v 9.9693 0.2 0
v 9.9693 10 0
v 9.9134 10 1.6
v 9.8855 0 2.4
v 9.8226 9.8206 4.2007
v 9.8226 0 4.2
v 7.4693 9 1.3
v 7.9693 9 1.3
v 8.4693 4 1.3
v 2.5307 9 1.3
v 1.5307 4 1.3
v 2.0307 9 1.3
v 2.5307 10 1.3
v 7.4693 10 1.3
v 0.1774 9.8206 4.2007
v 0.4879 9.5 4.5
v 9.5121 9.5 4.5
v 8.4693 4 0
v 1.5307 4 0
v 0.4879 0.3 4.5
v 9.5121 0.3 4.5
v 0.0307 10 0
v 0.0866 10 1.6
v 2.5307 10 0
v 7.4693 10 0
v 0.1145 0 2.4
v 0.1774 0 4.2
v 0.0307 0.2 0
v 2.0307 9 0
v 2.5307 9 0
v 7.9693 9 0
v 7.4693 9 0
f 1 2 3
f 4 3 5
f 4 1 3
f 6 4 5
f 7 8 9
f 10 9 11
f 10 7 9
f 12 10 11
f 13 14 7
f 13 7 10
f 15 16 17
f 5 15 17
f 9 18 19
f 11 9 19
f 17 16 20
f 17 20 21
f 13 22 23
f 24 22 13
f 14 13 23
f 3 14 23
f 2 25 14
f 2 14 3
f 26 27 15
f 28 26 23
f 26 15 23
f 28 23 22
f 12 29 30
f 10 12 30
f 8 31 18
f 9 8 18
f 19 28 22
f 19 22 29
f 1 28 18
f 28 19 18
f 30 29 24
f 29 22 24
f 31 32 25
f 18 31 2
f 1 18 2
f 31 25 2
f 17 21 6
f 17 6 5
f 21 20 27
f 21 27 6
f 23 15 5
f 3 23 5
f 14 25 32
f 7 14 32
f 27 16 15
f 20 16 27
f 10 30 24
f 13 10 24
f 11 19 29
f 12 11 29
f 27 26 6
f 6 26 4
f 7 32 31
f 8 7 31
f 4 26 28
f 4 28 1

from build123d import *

# Parameters (mm, degrees)
SKETCH1_W           = 10
SKETCH1_H           = 10
BOSS_EXTRUDE1_DEPTH = 4.5
CHAMFER1_SIZE       = 2.9
CHAMFER1_SIZE2      = 0.2
CHAMFER3_SIZE       = 0.18787374
CHAMFER3_SIZE_2     = 5.38
CHAMFER4_SIZE       = 0.3
CUT_EXTRUDE1_DEPTH  = 1.3
CHAMFER5_SIZE       = 0.2
CHAMFER5_SIZE2      = 2.4


with BuildPart() as part:
    # Sketch1 → Boss-Extrude1 (new body)
    with BuildSketch(Plane.XY):
        with Locations((5, 5)):
            Rectangle(SKETCH1_W, SKETCH1_H)
    extrude(amount=BOSS_EXTRUDE1_DEPTH)

    # Chamfer1
    chamfer1_edges = [part.edges().sort_by_distance(p)[0] for p in [
        (5, 10, 4.5),
    ]]
    chamfer1_side = [part.faces().sort_by_distance(p)[0] for p in [
        (5, 10, 2.25),
    ]]
    chamfer(chamfer1_edges, length=CHAMFER1_SIZE, length2=CHAMFER1_SIZE2, reference=chamfer1_side[0])

    # Chamfer3
    # the kernel refuses this chamfer: 5.38, 0.18787374 mm, written as the material it takes off along each edge
    with BuildSketch(Plane(origin=(0, 23.787684867, 4.5), x_dir=(0.6724220033128364, 0, 0.7401679873250072), z_dir=(0, -1, 0))) as chamfer3_piece_1:
        Polygon((CHAMFER3_SIZE * 0.672422002832, -CHAMFER3_SIZE * 0.740167986796), (-CHAMFER3_SIZE_2 * 0.740167987325, -CHAMFER3_SIZE_2 * 0.672422003313), (0, 0), align=None)
    extrude(amount=37.775369733, mode=Mode.SUBTRACT)
    with BuildSketch(Plane(origin=(10, -13.987684867, 4.5), x_dir=(0.0013423185755924109, 0, -0.999999099090015), z_dir=(0, 1, 0))) as chamfer3_piece_2:
        Polygon((CHAMFER3_SIZE_2 * 0.99999909909, CHAMFER3_SIZE_2 * 0.00134231857559), (-CHAMFER3_SIZE * 0.00134231857463, CHAMFER3_SIZE * 0.999999098375), (0, 0), align=None)
    extrude(amount=37.775369733, mode=Mode.SUBTRACT)

    # Chamfer4
    chamfer4_edges = [part.edges().sort_by_distance(p)[0] for p in [
        (5, 9.8, 4.5),
        (5, 0, 4.5),
        (9.81212626, 4.9, 4.5),
        (0.18787374, 4.9, 4.5),
    ]]
    chamfer(chamfer4_edges, length=CHAMFER4_SIZE)

    # Sketch2 → Cut-Extrude1 (cut)
    with BuildSketch(Plane(origin=(0, 0, 0), x_dir=(-1, 0, 0), z_dir=(0, 0, -1))):
        Polygon((-7.469269723, 10), (-7.469269723, 9), (-7.969269723, 9), (-8.469269723, 4), (-1.530730277, 4), (-2.030730277, 9), (-2.530730277, 9), (-2.530730277, 10), align=None)
    extrude(amount=-CUT_EXTRUDE1_DEPTH, mode=Mode.SUBTRACT)

    # Chamfer5
    chamfer5_edges = [part.edges().sort_by_distance(p)[0] for p in [
        (5, 0, 0),
    ]]
    chamfer5_side = [part.faces().sort_by_distance(p)[0] for p in [
        (5, 3.900810123, 0),
    ]]
    chamfer(chamfer5_edges, length=CHAMFER5_SIZE, length2=CHAMFER5_SIZE2, reference=chamfer5_side[0])


solid = part.part
